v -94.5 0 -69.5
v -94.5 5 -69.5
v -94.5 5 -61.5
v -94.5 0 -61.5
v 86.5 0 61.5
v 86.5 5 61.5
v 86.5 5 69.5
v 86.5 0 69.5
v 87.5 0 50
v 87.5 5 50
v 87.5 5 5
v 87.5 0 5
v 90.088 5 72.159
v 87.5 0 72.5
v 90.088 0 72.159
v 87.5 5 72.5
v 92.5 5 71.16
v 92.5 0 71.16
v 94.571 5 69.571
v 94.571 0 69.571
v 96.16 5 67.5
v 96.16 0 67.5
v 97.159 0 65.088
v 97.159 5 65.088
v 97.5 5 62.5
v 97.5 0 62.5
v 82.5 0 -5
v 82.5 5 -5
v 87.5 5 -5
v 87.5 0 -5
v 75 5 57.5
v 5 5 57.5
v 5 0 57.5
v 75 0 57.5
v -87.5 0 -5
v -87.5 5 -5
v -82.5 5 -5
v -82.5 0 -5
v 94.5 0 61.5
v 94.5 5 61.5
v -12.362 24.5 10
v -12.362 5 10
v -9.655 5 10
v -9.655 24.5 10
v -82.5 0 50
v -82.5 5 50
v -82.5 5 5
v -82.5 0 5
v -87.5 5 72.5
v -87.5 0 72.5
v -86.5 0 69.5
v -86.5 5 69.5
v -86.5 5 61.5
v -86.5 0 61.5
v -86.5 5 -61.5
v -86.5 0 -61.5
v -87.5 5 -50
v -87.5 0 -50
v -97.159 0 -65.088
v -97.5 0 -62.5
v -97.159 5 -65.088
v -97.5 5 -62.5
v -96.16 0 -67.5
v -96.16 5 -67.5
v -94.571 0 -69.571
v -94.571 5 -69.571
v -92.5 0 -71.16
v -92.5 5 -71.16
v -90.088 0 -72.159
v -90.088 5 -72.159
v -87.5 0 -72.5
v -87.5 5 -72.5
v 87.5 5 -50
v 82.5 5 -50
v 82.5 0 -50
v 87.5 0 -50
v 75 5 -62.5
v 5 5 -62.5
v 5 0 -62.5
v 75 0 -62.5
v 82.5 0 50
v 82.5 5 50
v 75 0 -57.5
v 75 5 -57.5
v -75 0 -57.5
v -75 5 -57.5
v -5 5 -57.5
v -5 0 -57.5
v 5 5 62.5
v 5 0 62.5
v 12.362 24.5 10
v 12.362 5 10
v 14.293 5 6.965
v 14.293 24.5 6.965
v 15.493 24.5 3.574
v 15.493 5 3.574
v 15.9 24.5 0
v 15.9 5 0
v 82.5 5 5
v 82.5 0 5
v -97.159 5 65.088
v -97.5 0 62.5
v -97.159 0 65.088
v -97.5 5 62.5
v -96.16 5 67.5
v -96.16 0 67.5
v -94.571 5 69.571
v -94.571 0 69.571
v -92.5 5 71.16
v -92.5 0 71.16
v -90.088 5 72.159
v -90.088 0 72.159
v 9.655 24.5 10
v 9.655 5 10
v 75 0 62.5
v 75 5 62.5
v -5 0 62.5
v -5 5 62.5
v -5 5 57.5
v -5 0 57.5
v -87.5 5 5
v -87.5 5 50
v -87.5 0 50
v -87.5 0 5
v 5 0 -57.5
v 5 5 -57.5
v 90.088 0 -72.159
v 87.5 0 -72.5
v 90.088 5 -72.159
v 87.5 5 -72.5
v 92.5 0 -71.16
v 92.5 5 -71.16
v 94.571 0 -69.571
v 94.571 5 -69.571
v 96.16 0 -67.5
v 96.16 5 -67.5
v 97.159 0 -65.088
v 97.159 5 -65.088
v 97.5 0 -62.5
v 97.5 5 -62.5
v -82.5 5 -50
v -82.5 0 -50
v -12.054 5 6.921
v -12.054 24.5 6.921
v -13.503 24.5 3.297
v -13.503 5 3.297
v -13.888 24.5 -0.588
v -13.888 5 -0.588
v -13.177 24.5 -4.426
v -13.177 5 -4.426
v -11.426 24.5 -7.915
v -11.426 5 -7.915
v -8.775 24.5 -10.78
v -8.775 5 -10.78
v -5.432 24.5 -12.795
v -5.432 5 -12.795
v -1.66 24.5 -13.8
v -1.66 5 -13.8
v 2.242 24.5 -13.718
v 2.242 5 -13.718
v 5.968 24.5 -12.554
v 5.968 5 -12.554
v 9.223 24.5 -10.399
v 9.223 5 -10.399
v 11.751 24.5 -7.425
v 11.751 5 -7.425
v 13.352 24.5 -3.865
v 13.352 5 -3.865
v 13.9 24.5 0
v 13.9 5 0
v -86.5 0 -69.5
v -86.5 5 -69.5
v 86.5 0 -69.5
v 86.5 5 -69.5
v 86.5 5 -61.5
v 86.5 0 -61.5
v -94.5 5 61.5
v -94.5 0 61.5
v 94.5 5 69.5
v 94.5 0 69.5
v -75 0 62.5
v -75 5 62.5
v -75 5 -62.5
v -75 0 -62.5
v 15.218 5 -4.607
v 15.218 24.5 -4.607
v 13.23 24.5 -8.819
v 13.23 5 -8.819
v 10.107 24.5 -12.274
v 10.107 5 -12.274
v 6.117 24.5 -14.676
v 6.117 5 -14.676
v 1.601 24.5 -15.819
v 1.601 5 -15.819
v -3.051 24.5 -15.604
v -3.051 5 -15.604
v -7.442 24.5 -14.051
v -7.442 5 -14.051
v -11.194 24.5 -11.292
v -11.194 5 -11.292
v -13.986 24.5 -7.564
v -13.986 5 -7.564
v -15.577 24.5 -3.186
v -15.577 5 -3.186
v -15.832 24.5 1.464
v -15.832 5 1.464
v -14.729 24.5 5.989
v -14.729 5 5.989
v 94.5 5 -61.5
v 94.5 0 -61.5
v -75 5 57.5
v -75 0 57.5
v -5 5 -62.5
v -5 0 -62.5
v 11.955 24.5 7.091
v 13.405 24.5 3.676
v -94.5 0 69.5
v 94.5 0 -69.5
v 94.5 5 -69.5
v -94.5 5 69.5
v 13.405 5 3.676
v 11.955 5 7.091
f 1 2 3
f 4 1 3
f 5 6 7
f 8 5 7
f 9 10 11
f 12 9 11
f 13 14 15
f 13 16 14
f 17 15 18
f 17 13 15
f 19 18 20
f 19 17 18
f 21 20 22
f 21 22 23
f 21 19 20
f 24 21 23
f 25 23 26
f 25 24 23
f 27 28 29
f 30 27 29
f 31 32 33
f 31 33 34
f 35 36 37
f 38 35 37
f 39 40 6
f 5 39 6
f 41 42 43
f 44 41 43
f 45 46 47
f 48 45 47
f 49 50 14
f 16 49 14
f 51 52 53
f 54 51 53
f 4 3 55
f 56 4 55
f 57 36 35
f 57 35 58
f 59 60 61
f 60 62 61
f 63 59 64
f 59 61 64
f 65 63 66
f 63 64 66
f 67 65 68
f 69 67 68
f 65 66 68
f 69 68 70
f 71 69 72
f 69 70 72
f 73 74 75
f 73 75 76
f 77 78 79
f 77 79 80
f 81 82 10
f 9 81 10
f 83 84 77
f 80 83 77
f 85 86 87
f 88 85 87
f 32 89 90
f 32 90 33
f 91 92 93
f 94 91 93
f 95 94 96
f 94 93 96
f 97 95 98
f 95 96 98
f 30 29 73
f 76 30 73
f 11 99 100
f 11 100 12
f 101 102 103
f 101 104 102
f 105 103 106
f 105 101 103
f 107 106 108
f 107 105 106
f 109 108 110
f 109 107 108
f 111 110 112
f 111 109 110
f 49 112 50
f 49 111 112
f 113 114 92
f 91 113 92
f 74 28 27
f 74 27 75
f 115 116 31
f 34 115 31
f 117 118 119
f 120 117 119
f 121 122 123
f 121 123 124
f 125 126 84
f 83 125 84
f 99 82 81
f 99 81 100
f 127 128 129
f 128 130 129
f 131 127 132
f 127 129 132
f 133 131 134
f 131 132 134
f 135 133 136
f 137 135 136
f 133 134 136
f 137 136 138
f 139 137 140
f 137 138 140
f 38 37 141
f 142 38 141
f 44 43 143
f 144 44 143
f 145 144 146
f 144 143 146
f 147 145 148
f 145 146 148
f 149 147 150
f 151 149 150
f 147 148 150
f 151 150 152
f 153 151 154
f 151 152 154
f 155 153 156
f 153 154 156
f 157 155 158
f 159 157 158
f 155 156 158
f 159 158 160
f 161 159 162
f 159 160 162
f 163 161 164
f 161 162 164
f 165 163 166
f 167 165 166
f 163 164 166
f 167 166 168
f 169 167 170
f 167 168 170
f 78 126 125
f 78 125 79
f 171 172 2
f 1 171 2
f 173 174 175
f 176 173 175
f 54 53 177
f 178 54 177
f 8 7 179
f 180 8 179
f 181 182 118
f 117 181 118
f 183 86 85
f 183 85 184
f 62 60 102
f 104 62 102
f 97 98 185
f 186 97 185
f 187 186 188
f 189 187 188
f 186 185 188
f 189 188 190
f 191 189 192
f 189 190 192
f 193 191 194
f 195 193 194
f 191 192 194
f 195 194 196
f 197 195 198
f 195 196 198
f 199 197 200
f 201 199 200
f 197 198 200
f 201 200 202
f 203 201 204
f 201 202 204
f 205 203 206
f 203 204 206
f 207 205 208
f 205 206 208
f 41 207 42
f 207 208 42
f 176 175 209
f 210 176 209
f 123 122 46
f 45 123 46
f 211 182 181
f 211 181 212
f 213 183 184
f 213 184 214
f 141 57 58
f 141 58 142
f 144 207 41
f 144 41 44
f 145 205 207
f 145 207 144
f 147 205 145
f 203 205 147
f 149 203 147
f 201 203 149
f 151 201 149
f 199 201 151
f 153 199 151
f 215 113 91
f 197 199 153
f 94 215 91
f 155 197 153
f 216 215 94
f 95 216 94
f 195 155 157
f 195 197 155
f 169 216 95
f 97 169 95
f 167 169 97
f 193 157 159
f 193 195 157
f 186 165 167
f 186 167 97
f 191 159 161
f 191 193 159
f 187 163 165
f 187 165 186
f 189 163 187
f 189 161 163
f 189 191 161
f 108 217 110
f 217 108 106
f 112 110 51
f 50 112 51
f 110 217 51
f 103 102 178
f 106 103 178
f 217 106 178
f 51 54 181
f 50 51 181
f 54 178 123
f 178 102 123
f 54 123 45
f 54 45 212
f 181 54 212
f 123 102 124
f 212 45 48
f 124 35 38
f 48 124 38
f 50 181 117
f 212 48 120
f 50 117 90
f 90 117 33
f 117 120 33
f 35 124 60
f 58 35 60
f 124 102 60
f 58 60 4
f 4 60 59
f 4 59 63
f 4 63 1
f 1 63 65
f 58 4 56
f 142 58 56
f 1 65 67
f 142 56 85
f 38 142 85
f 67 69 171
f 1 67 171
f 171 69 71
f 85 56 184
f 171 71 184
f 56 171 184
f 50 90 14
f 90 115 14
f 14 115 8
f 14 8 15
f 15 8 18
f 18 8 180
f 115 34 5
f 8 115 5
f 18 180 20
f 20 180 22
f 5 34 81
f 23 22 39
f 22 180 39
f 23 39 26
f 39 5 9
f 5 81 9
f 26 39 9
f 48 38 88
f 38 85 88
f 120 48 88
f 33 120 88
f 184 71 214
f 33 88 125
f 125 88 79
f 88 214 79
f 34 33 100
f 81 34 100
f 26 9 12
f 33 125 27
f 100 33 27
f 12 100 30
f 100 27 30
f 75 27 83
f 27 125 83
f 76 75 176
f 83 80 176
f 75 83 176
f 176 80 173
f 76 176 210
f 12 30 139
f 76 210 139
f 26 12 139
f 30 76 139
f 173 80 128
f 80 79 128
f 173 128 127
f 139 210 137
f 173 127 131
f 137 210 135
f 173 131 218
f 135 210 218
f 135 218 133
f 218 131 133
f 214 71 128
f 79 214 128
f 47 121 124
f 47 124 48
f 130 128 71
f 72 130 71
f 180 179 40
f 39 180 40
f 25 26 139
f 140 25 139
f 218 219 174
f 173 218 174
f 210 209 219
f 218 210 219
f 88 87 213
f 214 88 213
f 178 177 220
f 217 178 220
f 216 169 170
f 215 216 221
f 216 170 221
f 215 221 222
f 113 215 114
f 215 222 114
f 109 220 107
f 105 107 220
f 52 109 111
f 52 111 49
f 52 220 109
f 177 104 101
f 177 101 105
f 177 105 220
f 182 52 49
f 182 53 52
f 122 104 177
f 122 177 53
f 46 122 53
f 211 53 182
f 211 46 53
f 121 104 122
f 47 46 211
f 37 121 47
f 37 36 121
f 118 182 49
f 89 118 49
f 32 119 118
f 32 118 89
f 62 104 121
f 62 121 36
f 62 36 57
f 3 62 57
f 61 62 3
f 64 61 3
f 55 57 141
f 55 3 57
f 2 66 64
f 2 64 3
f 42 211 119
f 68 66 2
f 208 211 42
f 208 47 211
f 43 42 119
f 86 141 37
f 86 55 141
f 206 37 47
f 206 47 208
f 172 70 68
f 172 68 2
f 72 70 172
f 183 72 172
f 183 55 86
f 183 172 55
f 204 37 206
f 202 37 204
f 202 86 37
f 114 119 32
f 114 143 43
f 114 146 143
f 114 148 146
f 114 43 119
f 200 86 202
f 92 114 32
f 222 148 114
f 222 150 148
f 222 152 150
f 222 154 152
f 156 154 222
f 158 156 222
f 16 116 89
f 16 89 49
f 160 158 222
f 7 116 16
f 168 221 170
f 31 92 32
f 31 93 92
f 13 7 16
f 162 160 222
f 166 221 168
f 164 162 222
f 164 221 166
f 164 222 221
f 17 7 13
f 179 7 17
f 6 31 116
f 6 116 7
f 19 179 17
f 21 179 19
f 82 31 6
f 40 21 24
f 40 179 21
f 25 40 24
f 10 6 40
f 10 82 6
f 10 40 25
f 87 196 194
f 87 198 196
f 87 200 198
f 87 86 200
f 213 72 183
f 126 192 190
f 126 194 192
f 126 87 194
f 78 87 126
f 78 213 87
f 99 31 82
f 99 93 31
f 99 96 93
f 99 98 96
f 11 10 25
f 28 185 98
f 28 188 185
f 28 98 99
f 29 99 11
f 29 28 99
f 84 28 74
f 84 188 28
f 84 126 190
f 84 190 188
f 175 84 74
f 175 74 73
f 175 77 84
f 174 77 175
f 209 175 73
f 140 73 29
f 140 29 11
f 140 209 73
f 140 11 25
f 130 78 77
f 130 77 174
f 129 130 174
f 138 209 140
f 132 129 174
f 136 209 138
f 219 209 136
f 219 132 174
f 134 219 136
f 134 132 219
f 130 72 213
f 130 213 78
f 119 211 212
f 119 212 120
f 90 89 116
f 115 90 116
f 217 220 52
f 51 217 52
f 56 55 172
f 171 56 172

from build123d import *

# Parameters (mm, degrees)
BOSS_EXTRUDE2_DEPTH = 5
SKETCH5_W           = 5
SKETCH5_H           = 45
SKETCH5_W_2         = 70
SKETCH5_H_2         = 5
CUT_EXTRUDE5_DEPTH  = 6
BOSS_EXTRUDE3_DEPTH = 19.5
FILLET1_R           = 10
CUT_EXTRUDE6_DEPTH  = 5


with BuildPart() as part:
    # Sketch4 → Boss-Extrude2 (new body)
    with BuildSketch(Plane(origin=(0, 0, 0), x_dir=(1, 0, 0), z_dir=(0, 1, 0))):
        Polygon((0, 0), (-97.5, 72.5), (-97.5, -72.5), align=None)
        Polygon((0, 0), (-97.5, -72.5), (97.5, -72.5), align=None)
        Polygon((97.5, 72.5), (-97.5, 72.5), (0, 0), align=None)
        Polygon((97.5, -72.5), (97.5, 72.5), (0, 0), align=None)
    extrude(amount=BOSS_EXTRUDE2_DEPTH)

    # Sketch5 → Cut-Extrude5 (cut, through all)
    with BuildSketch(Plane(origin=(0, 5, 0), x_dir=(1, 0, 0), z_dir=(0, 1, 0))):
        with Locations((-85, 27.5)):
            Rectangle(SKETCH5_W, SKETCH5_H)
        with Locations((-85, -27.5)):
            Rectangle(SKETCH5_W, SKETCH5_H)
        with Locations((-40, -60)):
            Rectangle(SKETCH5_W_2, SKETCH5_H_2)
        with Locations((40, -60)):
            Rectangle(SKETCH5_W_2, SKETCH5_H_2)
        with Locations((85, -27.5)):
            Rectangle(SKETCH5_W, SKETCH5_H)
        with Locations((85, 27.5)):
            Rectangle(SKETCH5_W, SKETCH5_H)
        with Locations((40, 60)):
            Rectangle(SKETCH5_W_2, SKETCH5_H_2)
        with Locations((-40, 60)):
            Rectangle(SKETCH5_W_2, SKETCH5_H_2)
    extrude(amount=-CUT_EXTRUDE5_DEPTH, mode=Mode.SUBTRACT)

    # Sketch6 → Boss-Extrude3 (add)
    with BuildSketch(Plane(origin=(0, 5, 0), x_dir=(1, 0, 0), z_dir=(0, 1, 0))):
        with BuildLine():
            ThreePointArc((15.9, 0), (-5.30377301, 14.989329267), (-12.361634196, -10))
            Line((-12.361634196, -10), (-9.654532614, -10))
            ThreePointArc((-9.654532614, -10), (-5.431942409, 12.794686462), (13.9, 0))
            ThreePointArc((13.9, 0), (12.794686462, -5.431942409), (9.654532614, -10))
            Line((9.654532614, -10), (12.361634196, -10))
            ThreePointArc((12.361634196, -10), (14.989329267, -5.30377301), (15.9, 0))
        make_face()
    extrude(amount=BOSS_EXTRUDE3_DEPTH)

    # Fillet1
    fillet1_edges = [part.edges().sort_by_distance(p)[0] for p in [
        (-97.5, 2.5, 72.5),
        (-97.5, 2.5, -72.5),
        (97.5, 2.5, -72.5),
        (97.5, 2.5, 72.5),
    ]]
    fillet(fillet1_edges, radius=FILLET1_R)

    # Sketch7 → Cut-Extrude6 (cut)
    with BuildSketch(Plane(origin=(0, 5, 0), x_dir=(1, 0, 0), z_dir=(0, 1, 0))):
        Polygon((-86.5, 69.5), (-94.5, 69.5), (-86.5, 63.616402116), align=None)
        Polygon((-94.5, 69.5), (-94.5, 61.5), (-86.5, 61.5), (-86.5, 63.616402116), align=None)
        Polygon((-86.5, -61.5), (-94.5, -61.5), (-94.5, -69.5), (-86.5, -63.616402116), align=None)
        Polygon((-86.5, -63.616402116), (-94.5, -69.5), (-86.5, -69.5), align=None)
        Polygon((86.5, -63.616402116), (86.5, -69.5), (94.5, -69.5), align=None)
        Polygon((86.5, -61.5), (86.5, -63.616402116), (94.5, -69.5), (94.5, -61.5), align=None)
        Polygon((86.5, 69.5), (86.5, 63.616402116), (94.5, 69.5), align=None)
        Polygon((94.5, 69.5), (86.5, 63.616402116), (86.5, 61.5), (94.5, 61.5), align=None)
    extrude(amount=-CUT_EXTRUDE6_DEPTH, mode=Mode.SUBTRACT)


solid = part.part
